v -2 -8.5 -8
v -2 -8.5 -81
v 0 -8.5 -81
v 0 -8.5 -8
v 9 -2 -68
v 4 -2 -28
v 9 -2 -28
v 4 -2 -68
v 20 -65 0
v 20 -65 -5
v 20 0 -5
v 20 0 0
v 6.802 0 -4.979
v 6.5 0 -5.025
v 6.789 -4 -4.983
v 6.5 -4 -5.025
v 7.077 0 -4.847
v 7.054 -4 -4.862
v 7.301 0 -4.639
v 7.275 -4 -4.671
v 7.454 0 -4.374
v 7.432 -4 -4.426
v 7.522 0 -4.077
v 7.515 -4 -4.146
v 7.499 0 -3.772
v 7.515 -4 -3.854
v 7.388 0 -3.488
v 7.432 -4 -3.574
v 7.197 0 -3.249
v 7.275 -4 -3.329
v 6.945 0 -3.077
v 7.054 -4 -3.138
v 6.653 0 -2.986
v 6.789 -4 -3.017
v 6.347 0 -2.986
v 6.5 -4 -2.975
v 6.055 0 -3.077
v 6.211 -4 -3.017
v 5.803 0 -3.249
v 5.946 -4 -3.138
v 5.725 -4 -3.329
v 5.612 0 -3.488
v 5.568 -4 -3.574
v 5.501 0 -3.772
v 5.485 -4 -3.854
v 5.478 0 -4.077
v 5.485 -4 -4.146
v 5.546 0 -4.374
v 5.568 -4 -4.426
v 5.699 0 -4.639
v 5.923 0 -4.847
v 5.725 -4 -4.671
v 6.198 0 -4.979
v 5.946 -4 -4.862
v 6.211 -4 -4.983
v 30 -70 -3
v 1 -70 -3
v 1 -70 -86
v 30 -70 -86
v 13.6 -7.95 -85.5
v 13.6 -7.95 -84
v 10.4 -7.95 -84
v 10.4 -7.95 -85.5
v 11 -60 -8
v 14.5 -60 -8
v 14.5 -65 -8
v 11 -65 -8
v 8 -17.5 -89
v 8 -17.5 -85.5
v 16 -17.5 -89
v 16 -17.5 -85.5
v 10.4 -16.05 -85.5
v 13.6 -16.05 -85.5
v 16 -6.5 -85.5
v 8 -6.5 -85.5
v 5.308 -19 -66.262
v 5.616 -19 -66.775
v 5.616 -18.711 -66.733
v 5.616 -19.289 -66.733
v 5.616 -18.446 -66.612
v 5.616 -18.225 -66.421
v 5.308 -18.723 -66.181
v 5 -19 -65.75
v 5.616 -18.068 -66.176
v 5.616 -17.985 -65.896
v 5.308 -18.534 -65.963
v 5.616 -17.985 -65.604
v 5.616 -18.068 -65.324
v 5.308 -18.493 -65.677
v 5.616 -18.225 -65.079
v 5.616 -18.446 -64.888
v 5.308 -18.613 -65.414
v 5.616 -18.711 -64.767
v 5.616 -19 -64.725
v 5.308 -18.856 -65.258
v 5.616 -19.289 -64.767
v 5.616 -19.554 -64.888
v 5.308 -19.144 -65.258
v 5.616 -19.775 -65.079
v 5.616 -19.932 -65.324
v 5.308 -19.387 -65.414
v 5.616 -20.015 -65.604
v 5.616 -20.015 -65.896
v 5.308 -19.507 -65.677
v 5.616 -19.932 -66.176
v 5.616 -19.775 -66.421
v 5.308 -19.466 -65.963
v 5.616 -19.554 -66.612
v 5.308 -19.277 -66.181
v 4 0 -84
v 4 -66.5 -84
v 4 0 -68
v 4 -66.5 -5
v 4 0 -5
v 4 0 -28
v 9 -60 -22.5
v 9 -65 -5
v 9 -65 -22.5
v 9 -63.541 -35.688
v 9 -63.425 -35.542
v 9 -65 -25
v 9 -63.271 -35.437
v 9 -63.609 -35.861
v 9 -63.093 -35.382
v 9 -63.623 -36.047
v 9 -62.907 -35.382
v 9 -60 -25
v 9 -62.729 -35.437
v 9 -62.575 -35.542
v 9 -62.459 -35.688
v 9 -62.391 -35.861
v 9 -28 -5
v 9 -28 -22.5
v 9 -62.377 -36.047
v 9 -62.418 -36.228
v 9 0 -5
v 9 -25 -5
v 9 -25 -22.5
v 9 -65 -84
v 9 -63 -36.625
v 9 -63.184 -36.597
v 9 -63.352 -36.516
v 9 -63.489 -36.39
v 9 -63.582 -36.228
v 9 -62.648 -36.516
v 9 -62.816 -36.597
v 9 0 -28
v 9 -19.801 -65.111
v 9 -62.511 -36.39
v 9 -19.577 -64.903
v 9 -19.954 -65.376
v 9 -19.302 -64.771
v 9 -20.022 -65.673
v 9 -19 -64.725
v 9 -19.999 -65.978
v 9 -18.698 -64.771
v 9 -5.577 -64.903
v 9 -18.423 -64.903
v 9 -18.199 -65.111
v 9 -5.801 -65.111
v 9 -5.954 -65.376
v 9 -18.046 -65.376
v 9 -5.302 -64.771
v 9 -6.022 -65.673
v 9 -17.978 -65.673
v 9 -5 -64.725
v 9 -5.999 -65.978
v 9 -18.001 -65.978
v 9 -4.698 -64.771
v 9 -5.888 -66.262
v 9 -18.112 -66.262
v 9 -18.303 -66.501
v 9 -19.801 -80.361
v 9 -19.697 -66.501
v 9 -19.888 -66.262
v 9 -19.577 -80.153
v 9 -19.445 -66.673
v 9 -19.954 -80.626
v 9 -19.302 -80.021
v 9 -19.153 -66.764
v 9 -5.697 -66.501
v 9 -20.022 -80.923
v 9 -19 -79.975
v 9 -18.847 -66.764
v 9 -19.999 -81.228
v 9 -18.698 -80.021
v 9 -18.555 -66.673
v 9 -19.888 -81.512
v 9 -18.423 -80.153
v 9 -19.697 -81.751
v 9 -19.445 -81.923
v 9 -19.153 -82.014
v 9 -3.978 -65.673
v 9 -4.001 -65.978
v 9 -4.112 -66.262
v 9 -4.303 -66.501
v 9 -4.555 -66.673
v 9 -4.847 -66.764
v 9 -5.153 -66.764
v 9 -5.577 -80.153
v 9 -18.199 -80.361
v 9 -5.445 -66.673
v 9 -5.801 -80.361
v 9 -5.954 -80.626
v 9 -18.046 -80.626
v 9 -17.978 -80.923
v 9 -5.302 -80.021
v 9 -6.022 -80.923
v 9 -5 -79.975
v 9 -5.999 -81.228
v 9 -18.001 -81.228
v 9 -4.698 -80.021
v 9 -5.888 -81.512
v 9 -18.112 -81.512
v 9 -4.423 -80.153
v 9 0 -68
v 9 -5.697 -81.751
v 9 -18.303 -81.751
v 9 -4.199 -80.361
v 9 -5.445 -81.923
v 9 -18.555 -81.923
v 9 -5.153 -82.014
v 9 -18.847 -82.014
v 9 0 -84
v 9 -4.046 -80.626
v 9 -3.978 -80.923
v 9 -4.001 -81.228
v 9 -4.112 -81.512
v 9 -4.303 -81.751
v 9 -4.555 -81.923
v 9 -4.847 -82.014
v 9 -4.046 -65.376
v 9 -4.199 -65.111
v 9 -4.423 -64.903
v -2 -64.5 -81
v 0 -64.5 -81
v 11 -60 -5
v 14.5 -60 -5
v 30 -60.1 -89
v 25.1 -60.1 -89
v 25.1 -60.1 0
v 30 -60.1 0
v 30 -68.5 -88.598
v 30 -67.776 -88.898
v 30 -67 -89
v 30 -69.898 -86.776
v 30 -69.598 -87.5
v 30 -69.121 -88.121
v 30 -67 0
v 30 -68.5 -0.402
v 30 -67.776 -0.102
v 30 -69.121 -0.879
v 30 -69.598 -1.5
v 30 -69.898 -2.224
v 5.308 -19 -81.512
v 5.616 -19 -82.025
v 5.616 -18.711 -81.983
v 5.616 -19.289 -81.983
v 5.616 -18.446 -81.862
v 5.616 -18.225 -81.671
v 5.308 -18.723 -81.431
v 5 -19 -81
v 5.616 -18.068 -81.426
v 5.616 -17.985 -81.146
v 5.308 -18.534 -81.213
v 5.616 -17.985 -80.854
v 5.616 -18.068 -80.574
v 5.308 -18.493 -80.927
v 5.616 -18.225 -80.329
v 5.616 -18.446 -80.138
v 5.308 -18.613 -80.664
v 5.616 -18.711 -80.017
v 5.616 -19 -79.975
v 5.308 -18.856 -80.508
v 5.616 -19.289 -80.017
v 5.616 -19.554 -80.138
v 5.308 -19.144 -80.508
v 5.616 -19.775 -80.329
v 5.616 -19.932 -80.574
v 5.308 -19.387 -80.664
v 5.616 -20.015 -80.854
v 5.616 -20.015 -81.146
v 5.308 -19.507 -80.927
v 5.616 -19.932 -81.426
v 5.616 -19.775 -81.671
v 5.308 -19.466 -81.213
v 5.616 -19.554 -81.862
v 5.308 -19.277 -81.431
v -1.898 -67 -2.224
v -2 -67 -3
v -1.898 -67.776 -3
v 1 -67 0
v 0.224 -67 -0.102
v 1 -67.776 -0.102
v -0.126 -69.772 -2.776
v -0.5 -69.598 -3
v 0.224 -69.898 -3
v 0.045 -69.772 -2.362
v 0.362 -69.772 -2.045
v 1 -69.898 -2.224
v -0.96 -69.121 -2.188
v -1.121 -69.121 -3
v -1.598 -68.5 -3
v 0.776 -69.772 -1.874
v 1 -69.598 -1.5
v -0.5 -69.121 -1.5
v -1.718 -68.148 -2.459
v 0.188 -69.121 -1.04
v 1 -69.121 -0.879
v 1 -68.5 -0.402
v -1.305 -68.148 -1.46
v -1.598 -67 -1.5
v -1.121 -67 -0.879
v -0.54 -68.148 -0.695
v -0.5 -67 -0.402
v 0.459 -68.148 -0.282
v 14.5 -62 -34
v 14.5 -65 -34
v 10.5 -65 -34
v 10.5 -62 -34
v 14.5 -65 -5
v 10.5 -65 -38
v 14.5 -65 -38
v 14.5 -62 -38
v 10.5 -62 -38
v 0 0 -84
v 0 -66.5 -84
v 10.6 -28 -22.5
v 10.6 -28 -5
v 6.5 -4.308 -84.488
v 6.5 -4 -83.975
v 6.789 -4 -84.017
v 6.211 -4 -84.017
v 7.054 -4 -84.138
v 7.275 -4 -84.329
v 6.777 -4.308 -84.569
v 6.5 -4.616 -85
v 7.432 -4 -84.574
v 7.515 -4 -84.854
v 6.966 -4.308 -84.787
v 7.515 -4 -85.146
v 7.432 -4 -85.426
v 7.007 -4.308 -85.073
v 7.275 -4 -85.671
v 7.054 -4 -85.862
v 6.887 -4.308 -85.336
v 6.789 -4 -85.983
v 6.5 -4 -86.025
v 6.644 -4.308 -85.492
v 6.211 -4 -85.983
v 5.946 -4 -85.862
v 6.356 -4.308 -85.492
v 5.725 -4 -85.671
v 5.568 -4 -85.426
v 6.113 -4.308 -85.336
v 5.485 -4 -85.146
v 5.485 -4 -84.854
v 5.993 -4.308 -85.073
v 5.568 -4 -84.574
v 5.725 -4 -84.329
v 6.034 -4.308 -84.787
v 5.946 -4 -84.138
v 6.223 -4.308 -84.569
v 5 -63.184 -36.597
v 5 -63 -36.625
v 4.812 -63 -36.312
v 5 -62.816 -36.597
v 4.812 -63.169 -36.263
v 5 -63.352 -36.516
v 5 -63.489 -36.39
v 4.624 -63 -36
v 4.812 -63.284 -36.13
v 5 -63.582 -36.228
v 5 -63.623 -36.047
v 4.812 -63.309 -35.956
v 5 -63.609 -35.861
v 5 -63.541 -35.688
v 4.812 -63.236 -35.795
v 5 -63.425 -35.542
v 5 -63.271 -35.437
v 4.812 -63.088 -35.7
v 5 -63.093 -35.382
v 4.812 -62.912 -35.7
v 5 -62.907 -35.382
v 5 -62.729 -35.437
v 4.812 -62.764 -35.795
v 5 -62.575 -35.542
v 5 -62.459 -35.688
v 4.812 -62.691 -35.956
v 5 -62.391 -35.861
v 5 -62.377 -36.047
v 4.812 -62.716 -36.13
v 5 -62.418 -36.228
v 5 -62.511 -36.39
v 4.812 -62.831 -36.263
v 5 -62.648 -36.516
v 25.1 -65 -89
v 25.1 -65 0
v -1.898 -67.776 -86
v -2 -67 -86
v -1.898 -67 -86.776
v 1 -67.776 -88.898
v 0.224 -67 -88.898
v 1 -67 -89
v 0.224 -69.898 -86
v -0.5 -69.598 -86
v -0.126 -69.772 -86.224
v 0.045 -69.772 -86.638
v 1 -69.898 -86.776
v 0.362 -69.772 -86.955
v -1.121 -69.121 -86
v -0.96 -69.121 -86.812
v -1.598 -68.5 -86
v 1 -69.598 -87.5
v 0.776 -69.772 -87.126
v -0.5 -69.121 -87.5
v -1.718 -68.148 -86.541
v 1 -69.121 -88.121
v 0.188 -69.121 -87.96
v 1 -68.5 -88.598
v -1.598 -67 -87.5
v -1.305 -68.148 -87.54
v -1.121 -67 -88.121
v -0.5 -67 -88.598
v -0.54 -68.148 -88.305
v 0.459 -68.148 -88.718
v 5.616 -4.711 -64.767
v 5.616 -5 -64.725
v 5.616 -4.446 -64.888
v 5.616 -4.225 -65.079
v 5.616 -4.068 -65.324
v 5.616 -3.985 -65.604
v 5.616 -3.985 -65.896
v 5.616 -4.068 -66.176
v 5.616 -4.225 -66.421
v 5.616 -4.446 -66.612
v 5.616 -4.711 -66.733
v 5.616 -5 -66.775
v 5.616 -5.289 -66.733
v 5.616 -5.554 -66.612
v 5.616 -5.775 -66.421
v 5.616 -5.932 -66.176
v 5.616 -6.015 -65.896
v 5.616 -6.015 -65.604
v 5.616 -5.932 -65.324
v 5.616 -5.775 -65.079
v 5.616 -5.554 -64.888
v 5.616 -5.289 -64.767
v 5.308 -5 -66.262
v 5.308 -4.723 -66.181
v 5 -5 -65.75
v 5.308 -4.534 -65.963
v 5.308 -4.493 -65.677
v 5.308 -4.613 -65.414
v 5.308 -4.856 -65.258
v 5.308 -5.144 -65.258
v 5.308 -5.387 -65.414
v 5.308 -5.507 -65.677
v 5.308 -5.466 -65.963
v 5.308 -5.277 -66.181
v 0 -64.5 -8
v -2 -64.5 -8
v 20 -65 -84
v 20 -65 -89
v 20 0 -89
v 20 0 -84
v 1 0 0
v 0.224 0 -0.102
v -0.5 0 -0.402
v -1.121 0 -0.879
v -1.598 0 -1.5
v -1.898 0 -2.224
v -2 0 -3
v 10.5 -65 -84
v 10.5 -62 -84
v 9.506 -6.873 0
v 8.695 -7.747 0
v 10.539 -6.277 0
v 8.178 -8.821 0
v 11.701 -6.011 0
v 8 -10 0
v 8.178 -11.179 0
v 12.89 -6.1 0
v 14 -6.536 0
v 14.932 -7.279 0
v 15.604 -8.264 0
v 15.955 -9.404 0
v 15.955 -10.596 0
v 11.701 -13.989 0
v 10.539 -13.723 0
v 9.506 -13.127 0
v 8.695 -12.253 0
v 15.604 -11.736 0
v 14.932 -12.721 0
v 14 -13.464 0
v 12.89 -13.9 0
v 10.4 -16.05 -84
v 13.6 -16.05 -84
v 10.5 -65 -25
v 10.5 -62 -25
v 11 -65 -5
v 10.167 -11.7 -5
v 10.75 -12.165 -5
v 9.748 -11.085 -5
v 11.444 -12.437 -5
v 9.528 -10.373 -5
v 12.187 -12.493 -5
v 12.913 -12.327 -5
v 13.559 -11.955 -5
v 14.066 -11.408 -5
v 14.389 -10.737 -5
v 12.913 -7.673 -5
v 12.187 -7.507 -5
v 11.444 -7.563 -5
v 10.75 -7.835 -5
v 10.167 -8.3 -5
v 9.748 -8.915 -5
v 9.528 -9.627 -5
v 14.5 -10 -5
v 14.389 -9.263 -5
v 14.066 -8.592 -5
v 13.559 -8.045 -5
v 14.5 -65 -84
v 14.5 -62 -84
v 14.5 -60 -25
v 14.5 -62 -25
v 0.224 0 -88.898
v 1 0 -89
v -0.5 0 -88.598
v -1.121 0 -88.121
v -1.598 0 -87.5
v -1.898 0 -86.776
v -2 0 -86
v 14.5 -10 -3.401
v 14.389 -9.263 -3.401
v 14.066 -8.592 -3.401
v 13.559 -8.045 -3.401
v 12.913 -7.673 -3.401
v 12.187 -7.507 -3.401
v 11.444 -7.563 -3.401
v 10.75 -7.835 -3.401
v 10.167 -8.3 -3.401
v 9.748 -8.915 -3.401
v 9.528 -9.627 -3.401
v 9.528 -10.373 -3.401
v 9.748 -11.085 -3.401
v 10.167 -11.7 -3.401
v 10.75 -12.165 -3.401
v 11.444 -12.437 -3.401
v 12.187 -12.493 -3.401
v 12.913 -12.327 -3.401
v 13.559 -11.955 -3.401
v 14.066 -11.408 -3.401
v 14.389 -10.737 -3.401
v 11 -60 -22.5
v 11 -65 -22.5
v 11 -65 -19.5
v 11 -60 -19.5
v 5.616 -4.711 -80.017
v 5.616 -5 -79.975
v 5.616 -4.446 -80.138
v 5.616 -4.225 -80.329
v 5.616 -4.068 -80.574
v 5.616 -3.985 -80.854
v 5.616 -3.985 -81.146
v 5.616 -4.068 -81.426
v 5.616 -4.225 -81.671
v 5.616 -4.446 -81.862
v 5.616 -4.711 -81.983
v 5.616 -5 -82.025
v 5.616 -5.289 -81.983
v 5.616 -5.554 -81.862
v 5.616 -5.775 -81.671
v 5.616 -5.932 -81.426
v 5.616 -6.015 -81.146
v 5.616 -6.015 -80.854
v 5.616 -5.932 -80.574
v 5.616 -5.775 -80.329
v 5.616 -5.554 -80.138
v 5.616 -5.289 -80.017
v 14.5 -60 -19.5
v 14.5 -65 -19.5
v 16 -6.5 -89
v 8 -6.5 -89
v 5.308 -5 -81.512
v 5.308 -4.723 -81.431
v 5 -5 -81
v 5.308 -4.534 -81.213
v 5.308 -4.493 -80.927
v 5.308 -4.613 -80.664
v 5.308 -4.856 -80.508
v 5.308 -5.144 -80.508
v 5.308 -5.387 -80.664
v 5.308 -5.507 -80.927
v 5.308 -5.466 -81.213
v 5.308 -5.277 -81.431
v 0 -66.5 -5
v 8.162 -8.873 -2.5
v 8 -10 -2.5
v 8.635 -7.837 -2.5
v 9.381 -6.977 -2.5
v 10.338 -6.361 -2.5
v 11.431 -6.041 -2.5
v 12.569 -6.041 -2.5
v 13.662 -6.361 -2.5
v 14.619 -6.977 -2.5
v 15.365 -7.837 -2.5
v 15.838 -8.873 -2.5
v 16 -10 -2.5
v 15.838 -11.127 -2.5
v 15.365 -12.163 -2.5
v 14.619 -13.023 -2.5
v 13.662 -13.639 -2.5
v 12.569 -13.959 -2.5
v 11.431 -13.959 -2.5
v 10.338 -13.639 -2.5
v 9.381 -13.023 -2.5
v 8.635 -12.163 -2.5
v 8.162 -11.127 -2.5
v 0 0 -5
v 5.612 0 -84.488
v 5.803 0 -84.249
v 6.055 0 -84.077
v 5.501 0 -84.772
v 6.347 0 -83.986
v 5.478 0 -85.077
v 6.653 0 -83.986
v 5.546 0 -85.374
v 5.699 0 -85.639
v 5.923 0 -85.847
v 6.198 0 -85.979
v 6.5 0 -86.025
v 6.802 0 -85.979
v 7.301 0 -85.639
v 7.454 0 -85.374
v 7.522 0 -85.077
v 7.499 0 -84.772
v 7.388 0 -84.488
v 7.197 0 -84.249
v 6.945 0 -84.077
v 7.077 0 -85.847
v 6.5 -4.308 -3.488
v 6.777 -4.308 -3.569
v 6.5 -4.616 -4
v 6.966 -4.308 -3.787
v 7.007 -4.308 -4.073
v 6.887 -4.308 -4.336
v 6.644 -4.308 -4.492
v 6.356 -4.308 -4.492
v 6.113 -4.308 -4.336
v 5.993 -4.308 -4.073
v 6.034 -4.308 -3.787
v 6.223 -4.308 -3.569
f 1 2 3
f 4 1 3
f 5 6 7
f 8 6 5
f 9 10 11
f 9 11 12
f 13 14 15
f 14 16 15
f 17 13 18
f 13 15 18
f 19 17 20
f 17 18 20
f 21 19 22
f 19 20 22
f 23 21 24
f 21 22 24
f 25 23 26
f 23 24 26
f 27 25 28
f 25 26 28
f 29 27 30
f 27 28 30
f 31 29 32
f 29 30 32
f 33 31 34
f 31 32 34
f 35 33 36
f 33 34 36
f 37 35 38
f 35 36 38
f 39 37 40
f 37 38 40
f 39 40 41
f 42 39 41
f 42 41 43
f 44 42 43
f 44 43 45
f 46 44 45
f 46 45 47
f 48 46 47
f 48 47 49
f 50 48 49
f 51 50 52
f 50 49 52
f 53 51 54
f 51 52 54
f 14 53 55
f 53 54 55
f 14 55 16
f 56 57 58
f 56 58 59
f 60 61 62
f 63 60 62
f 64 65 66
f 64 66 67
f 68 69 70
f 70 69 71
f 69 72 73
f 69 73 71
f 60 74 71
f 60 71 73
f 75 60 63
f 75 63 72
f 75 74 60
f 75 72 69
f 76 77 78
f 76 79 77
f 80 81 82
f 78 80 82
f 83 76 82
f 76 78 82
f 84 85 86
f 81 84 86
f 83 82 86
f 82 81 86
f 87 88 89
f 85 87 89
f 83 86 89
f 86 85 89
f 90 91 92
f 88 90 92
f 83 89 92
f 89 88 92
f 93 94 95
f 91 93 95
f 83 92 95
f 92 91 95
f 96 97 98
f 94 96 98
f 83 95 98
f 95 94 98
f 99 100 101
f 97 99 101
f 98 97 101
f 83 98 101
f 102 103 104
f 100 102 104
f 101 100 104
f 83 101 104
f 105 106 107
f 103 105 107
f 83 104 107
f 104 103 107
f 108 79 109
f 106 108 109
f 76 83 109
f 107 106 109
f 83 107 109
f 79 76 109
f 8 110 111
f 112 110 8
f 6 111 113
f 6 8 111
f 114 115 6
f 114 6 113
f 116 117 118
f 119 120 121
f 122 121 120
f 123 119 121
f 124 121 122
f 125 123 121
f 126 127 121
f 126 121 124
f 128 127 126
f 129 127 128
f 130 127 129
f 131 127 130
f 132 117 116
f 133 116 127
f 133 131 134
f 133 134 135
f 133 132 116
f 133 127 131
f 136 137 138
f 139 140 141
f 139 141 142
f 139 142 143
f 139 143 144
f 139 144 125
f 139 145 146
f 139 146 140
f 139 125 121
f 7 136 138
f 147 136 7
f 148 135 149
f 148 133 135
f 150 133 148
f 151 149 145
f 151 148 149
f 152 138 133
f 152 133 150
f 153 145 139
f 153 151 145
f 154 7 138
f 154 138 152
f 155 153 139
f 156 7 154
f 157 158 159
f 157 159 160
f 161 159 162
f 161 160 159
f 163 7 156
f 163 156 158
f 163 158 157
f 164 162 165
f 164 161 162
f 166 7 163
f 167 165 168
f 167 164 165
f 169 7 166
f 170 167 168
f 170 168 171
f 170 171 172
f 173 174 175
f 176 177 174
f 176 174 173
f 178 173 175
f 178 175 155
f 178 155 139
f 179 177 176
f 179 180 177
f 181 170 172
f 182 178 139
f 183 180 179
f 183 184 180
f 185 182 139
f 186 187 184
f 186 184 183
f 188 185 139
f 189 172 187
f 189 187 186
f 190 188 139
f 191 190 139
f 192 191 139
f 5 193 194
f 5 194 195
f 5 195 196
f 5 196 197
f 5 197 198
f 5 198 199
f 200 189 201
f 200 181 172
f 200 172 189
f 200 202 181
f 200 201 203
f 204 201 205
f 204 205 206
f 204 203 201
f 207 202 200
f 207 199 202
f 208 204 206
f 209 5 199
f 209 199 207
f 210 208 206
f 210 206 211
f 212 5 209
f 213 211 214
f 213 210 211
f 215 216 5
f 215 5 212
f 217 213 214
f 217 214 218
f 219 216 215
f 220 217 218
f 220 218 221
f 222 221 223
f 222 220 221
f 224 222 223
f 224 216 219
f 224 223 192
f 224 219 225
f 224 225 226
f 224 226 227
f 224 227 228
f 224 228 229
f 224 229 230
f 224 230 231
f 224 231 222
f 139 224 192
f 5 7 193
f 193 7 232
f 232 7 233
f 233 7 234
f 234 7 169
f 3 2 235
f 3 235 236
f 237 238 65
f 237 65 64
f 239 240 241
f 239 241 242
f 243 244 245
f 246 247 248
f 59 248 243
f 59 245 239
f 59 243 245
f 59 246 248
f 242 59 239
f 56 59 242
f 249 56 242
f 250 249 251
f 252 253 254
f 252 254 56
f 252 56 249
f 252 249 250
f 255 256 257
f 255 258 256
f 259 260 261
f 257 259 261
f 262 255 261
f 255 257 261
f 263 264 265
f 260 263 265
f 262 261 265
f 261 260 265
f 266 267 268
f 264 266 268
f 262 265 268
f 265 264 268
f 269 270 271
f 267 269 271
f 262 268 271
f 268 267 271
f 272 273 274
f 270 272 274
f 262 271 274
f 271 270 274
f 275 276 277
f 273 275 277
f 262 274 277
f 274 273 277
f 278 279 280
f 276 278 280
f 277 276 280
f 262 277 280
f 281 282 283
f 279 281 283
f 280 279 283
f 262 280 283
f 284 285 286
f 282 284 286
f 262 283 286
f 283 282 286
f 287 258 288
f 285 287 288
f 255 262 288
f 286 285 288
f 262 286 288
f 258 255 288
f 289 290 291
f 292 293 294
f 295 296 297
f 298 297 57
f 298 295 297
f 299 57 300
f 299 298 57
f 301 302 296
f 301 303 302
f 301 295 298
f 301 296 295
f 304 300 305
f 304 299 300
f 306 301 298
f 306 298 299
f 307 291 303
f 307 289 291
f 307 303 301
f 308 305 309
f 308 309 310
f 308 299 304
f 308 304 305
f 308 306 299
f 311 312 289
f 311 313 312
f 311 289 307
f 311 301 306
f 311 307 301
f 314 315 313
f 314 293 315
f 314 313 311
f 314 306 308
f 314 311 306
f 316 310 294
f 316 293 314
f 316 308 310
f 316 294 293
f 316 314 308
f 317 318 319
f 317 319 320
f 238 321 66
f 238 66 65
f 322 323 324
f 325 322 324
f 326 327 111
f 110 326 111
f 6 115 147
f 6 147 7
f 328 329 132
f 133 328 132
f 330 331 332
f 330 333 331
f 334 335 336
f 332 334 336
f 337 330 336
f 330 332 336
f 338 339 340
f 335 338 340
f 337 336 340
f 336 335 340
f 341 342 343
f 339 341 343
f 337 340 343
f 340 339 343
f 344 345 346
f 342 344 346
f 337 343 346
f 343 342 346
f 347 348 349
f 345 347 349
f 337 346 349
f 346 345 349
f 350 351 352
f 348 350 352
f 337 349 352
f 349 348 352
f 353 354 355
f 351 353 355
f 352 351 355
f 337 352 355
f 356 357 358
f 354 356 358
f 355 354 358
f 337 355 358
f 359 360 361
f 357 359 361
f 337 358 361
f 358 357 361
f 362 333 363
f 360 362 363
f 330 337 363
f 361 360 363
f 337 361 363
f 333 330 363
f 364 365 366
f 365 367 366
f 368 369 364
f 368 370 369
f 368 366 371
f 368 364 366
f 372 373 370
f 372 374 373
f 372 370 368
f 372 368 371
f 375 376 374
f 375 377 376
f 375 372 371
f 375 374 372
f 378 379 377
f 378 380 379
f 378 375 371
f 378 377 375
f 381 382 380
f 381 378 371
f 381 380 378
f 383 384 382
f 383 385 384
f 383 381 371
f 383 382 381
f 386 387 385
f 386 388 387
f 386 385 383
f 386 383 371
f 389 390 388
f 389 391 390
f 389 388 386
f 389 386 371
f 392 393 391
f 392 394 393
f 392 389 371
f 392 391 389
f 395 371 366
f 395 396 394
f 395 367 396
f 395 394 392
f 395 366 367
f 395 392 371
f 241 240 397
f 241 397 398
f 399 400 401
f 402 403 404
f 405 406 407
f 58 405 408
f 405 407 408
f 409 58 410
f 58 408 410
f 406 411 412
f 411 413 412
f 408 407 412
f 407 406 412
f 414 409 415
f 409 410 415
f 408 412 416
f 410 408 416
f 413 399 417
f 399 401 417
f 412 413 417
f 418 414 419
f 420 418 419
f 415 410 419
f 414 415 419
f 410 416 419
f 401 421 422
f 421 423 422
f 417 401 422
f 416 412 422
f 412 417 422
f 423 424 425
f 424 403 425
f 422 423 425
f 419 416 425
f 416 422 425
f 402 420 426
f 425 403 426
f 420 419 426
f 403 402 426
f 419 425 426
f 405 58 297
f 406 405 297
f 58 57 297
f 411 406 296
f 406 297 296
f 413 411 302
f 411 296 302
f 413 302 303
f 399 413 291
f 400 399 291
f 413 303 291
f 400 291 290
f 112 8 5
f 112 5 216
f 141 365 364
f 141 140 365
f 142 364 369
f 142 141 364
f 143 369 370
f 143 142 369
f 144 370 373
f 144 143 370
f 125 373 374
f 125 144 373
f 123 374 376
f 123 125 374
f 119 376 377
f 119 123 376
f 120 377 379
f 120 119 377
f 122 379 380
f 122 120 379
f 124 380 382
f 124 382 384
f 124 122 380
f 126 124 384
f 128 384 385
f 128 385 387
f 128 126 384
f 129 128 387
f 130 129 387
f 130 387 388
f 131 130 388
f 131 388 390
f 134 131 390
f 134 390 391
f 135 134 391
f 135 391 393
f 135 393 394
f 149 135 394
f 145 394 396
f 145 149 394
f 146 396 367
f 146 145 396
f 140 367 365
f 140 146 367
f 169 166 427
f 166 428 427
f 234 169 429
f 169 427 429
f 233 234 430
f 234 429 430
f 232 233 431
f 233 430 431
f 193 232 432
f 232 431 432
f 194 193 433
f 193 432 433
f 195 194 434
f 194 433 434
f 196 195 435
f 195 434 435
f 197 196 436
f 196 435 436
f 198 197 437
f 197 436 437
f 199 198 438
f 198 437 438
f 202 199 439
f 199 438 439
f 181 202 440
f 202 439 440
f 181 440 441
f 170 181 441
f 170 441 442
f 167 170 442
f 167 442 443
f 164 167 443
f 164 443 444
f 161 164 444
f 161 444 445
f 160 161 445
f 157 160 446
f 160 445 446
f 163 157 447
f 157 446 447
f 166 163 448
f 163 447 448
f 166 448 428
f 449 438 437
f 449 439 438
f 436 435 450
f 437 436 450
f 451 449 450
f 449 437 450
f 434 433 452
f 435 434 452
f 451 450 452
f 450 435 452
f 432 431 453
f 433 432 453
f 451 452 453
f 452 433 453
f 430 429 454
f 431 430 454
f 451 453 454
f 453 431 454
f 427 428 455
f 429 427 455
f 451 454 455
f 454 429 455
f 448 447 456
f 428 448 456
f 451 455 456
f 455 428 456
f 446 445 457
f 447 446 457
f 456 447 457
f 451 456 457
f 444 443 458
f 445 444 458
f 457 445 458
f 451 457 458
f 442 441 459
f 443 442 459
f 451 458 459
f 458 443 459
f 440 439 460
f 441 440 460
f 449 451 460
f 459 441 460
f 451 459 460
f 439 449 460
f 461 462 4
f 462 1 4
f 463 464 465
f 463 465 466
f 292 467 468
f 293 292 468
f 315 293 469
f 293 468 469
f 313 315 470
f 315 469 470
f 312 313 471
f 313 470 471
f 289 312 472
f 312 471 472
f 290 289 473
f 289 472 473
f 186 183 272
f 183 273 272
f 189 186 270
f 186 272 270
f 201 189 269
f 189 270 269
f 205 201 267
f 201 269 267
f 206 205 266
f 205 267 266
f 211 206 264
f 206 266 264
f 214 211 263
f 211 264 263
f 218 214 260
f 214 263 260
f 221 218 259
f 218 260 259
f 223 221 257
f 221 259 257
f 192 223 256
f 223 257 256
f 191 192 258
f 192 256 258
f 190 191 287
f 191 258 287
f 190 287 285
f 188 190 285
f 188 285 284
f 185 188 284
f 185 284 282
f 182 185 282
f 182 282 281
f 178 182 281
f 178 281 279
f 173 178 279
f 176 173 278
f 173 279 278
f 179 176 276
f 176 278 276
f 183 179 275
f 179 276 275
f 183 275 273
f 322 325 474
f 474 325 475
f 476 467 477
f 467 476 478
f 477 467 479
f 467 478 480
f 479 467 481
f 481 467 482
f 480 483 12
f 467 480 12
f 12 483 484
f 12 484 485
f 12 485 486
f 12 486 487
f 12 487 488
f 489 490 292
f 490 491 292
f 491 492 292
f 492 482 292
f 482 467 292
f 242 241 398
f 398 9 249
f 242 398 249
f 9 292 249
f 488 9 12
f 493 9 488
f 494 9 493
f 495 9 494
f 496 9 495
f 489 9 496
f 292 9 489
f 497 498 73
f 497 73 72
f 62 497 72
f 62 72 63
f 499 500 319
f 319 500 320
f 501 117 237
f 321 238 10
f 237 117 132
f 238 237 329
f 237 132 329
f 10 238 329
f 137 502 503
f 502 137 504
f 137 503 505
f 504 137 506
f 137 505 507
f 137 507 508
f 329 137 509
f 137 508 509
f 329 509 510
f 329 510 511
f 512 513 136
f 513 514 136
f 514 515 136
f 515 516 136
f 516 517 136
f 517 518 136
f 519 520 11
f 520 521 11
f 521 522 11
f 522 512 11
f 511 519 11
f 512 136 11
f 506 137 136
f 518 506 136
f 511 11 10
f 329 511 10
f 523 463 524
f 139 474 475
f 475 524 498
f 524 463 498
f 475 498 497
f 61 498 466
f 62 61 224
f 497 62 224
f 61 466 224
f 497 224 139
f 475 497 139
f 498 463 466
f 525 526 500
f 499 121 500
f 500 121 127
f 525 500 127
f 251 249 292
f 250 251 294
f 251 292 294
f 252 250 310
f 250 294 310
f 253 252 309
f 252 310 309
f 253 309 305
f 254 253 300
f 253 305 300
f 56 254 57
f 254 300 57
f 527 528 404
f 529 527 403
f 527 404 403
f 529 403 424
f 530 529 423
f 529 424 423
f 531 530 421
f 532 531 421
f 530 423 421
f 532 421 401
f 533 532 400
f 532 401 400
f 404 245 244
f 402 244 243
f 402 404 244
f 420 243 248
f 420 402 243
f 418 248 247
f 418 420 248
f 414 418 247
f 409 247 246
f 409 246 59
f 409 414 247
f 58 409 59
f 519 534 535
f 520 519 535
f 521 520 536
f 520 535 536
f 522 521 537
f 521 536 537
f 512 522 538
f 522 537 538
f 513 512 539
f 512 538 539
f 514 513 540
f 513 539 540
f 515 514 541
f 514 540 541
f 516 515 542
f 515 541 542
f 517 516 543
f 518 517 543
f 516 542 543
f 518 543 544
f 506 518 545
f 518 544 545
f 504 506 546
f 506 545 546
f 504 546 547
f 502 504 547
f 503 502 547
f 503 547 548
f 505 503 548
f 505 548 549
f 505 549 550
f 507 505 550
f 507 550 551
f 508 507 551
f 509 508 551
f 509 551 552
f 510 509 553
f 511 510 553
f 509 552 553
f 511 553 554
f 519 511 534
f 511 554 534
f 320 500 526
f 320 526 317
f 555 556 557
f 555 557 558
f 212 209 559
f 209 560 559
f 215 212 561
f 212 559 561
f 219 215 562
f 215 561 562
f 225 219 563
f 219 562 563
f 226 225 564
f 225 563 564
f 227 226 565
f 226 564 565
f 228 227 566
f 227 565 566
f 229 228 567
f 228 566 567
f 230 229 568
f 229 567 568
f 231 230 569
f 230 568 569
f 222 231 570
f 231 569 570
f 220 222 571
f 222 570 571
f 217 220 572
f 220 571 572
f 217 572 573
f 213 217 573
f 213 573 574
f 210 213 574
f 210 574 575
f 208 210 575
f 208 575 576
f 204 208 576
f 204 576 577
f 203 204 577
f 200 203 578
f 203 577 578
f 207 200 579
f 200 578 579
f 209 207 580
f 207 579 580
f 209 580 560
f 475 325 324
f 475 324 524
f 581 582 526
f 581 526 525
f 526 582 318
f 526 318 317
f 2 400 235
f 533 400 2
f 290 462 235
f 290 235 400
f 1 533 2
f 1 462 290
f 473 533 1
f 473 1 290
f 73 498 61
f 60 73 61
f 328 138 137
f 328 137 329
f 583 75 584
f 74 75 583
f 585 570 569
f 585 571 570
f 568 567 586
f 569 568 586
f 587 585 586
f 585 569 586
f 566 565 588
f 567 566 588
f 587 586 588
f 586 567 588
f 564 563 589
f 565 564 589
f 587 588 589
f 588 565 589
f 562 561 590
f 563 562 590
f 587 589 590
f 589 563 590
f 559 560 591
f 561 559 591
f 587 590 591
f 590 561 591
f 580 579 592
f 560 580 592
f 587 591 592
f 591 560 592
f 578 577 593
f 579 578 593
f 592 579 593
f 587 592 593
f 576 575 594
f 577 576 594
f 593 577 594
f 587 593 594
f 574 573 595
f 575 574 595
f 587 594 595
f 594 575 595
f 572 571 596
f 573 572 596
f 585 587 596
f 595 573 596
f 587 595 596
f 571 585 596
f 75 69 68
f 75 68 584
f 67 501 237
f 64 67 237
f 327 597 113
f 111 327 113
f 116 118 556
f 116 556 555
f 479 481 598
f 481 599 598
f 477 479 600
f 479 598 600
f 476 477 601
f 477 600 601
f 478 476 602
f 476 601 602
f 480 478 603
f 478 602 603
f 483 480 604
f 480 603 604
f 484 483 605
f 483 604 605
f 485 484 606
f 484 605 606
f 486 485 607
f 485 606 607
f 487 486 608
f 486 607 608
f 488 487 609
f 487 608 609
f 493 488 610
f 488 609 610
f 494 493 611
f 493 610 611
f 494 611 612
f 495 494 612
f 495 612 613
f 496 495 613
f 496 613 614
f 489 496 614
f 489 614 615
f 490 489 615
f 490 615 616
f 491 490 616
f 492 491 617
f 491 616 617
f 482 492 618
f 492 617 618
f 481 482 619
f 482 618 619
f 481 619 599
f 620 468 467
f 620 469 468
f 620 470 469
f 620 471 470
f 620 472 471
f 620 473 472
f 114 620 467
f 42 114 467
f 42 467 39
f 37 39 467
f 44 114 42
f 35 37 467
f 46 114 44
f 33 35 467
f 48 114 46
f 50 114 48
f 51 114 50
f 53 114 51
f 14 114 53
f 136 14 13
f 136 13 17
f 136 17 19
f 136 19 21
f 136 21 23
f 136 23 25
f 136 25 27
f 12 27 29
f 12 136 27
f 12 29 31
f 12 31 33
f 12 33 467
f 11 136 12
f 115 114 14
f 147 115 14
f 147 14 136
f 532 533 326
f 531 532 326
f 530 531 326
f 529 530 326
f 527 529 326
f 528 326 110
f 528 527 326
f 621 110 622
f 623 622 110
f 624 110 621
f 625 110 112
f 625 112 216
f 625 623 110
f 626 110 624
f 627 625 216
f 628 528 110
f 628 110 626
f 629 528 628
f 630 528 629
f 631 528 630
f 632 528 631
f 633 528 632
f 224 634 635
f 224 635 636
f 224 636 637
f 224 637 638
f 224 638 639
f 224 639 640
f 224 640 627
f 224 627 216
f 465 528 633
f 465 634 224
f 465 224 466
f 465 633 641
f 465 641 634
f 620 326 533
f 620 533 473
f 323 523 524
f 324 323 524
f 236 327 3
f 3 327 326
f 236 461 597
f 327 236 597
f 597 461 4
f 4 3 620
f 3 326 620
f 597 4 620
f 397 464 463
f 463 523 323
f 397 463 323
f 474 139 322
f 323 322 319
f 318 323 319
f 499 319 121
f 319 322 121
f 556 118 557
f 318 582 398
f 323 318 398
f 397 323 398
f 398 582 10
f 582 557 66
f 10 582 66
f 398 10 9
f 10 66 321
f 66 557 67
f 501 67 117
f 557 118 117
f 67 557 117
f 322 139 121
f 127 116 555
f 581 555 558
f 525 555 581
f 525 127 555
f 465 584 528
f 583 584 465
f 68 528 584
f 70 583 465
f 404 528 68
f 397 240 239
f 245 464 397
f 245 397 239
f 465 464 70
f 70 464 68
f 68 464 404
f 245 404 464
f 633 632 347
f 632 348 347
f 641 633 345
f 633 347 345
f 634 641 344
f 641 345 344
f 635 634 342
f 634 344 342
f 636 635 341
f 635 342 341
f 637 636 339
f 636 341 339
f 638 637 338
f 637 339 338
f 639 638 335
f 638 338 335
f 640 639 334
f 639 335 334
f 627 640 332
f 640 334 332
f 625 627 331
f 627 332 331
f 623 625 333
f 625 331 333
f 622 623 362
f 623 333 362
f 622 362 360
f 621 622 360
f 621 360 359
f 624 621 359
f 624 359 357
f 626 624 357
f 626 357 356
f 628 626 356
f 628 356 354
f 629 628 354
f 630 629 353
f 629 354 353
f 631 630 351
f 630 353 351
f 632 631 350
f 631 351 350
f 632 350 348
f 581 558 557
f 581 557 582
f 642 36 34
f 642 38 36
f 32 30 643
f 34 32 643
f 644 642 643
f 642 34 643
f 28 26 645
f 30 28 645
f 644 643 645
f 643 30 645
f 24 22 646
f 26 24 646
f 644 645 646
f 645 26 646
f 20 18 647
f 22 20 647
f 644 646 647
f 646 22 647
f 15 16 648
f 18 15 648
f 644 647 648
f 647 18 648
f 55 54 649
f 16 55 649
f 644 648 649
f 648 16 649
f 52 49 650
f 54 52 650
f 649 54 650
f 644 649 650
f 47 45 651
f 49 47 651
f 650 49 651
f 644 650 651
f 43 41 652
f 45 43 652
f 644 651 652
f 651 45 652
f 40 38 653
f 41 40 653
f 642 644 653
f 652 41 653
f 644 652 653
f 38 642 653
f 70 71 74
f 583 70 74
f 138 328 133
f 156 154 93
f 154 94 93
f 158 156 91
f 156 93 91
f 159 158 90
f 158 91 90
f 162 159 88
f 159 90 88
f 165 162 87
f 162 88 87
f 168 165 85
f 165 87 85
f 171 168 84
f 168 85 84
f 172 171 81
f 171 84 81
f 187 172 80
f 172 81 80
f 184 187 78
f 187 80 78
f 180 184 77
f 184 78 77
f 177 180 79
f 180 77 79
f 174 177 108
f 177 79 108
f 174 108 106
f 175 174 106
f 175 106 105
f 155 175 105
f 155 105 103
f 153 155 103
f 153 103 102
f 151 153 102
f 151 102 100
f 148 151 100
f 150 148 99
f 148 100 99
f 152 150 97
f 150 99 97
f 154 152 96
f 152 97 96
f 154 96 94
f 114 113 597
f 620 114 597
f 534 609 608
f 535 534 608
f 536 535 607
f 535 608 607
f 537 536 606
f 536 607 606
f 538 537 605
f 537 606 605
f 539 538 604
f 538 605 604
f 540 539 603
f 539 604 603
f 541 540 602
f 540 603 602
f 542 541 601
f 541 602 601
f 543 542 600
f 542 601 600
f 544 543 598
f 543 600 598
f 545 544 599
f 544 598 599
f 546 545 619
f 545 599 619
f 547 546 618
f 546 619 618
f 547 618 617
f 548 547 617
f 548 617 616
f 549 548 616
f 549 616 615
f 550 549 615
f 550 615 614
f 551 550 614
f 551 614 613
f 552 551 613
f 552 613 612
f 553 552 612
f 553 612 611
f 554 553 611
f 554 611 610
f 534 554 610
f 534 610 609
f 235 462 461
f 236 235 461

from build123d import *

# Parameters (mm, degrees)
BOSS_EXTRUDE4_DEPTH          = 65
SKETCH5_W                    = 73
SKETCH5_H                    = 7
SKETCH5_H_2                  = 2
BOSS_EXTRUDE5_DEPTH          = 2
CUT_EXTRUDE8_DEPTH           = 111.756489652
CUT_EXTRUDE8_DEPTH_BACK      = 5
SKETCH9_W                    = 5
SKETCH9_H                    = 3
SKETCH9_W_2                  = 2.5
BOSS_EXTRUDE8_DEPTH          = 1.5
SKETCH10_W                   = 66.5
SKETCH10_H                   = 3
BOSS_EXTRUDE9_DEPTH          = 4
M2_5X0_45_TAPPED_HOLE1_D     = 2.05
M2_5X0_45_TAPPED_HOLE1_DEPTH = 3.384117865
M2_5X0_45_TAPPED_HOLE1_TIP   = 0.615882135
SKETCH17_W                   = 11
SKETCH17_H                   = 5
BOSS_EXTRUDE20_DEPTH         = 65
CUT_EXTRUDE10_REACH          = 110.079
SKETCH18_W                   = 8
SKETCH18_H                   = 11
SKETCH20_W                   = 2.5
SKETCH20_H                   = 2
BOSS_EXTRUDE13_DEPTH         = 5.5
SKETCH22_W                   = 3.5
SKETCH22_H                   = 5
BOSS_EXTRUDE21_DEPTH         = 3
SKETCH23_W                   = 3.499642839
SKETCH23_H                   = 5
BOSS_EXTRUDE17_DEPTH         = 3
BOSS_EXTRUDE18_DEPTH         = 17.5
SKETCH27_W                   = 4
SKETCH27_H                   = 3
CUT_EXTRUDE12_DEPTH          = 5.5
M2_5X0_45_TAPPED_HOLE2_D     = 2.05
M2_5X0_45_TAPPED_HOLE2_DEPTH = 4
M2_5X0_45_TAPPED_HOLE2_TIP   = 0.615882135
SKETCH31_W                   = 8
SKETCH31_H                   = 11
SKETCH31_W_2                 = 3.2
SKETCH31_H_2                 = 8.1
BOSS_EXTRUDE22_DEPTH         = 1.5
F_5_0MM_DOWEL_HOLE1_D        = 5
F_5_0MM_DOWEL_HOLE1_DEPTH    = 5
SKETCH36_W                   = 22
SKETCH36_H                   = 89
BOSS_EXTRUDE23_DEPTH         = 5
F_8_0MM_DOWEL_HOLE1_D        = 8
F_8_0MM_DOWEL_HOLE1_DEPTH    = 2.5
F_8_0MM_DOWEL_HOLE1_TIP      = 2.403442476
SKETCH42_W                   = 2
SKETCH42_H                   = 73
BOSS_EXTRUDE25_DEPTH         = 1.5
SKETCH43_W                   = 2
SKETCH43_H                   = 73
CUT_EXTRUDE13_DEPTH          = 1.5
SKETCH44_W                   = 4
SKETCH44_H                   = 79
CUT_EXTRUDE14_DEPTH          = 1.5
SKETCH46_W                   = 5
SKETCH46_H                   = 89
BOSS_EXTRUDE26_DEPTH         = 10
SKETCH46_3_W                 = 5
SKETCH46_3_H                 = 89
BOSS_EXTRUDE27_DEPTH         = 5
FILLET1_R                    = 3
SKETCH47_W                   = 5
SKETCH47_H                   = 89
CUT_EXTRUDE15_DEPTH          = 0.1
SKETCH48_W                   = 89
SKETCH48_H                   = 4.9
CUT_EXTRUDE16_DEPTH          = 0.1


with BuildPart() as part:
    # Sketch4 → Boss-Extrude4 (new body)
    with BuildSketch(Plane(origin=(0, 0, 0), x_dir=(1, 0, 0), z_dir=(0, 1, 0))):
        Polygon((0, 0), (9, 0), (9, 89), (0, 89), (-2, 89), (-2, 81), (0, 81), (0, 84), (4, 84), (4, 5), (0, 5), (0, 8), (-2, 8), (-2, 0), align=None)
    extrude(amount=-BOSS_EXTRUDE4_DEPTH)

    # Sketch5 → Boss-Extrude5 (add)
    with BuildSketch(Plane.ZY.offset(2)):
        with Locations((-44.5, -3.5)):
            Rectangle(SKETCH5_W, SKETCH5_H)
        with Locations((-44.5, -64)):
            Rectangle(SKETCH5_W, SKETCH5_H_2)
    extrude(amount=-BOSS_EXTRUDE5_DEPTH)

    # Sketch8 → Cut-Extrude8 (cut, two sides: drawn at the far end of the back side and taken through both)
    with BuildSketch(Plane(origin=(9, 0, 0), x_dir=(0, 0, -1), z_dir=(1, 0, 0)).offset(-CUT_EXTRUDE8_DEPTH_BACK)):
        Polygon((28, 198.138247042), (28, 0), (28, -2), (68, -2), (68, 0), (68, 198.138247042), (68, 594.414741126), (28, 594.414741126), align=None)
    extrude(amount=CUT_EXTRUDE8_DEPTH + CUT_EXTRUDE8_DEPTH_BACK, mode=Mode.SUBTRACT)

    # Sketch9 → Boss-Extrude8 (add)
    with BuildSketch(Plane(origin=(9, 0, 0), x_dir=(0, 0, -1), z_dir=(1, 0, 0))):
        with Locations((86.5, -63.5)):
            Rectangle(SKETCH9_W, SKETCH9_H)
        with Locations((23.75, -63.5)):
            Rectangle(SKETCH9_W_2, SKETCH9_H)
    extrude(amount=BOSS_EXTRUDE8_DEPTH)

    # Sketch10 → Boss-Extrude9 (add)
    with BuildSketch(Plane(origin=(10.5, 0, 0), x_dir=(0, 0, -1), z_dir=(1, 0, 0))):
        with Locations((55.75, -63.5)):
            Rectangle(SKETCH10_W, SKETCH10_H)
    extrude(amount=BOSS_EXTRUDE9_DEPTH)

    # M2.5x0.45 Tapped Hole1
    with Locations(Plane(origin=(9, 0, 0), x_dir=(0, 0, -1), z_dir=(1, 0, 0))):
        with Locations((81, -5), (65.75, -19), (81, -19), (65.75, -5)):
            Hole(M2_5X0_45_TAPPED_HOLE1_D / 2, depth=M2_5X0_45_TAPPED_HOLE1_DEPTH)
            with Locations((0, 0, -(M2_5X0_45_TAPPED_HOLE1_DEPTH + M2_5X0_45_TAPPED_HOLE1_TIP / 2))):  # 118° drill point
                Cone(0, M2_5X0_45_TAPPED_HOLE1_D / 2, M2_5X0_45_TAPPED_HOLE1_TIP, mode=Mode.SUBTRACT)

    # Sketch17 → Boss-Extrude20 (add)
    with BuildSketch(Plane(origin=(0, 0, 0), x_dir=(1, 0, 0), z_dir=(0, 1, 0))):
        with Locations((14.5, 86.5)):
            Rectangle(SKETCH17_W, SKETCH17_H)
        with Locations((14.5, 2.5)):
            Rectangle(SKETCH17_W, SKETCH17_H)
    extrude(amount=-BOSS_EXTRUDE20_DEPTH)

    # Sketch18 → Cut-Extrude10 (cut, up to next)
    with BuildSketch(Plane.XY.offset(-84), mode=Mode.PRIVATE) as cut_extrude10_sk1:
        with Locations((12, -12)):
            Rectangle(SKETCH18_W, SKETCH18_H)
    cut_extrude10_tool1 = extrude(cut_extrude10_sk1.sketch, amount=-CUT_EXTRUDE10_REACH, mode=Mode.PRIVATE) & part.part
    add(cut_extrude10_tool1.solids().sort_by_distance((12, -12, -84))[0], mode=Mode.SUBTRACT)

    # Sketch20 → Boss-Extrude13 (add)
    with BuildSketch(Plane(origin=(9, 0, 0), x_dir=(0, 0, -1), z_dir=(1, 0, 0))):
        with Locations((23.75, -61)):
            Rectangle(SKETCH20_W, SKETCH20_H)
    extrude(amount=BOSS_EXTRUDE13_DEPTH)

    # Sketch22 → Boss-Extrude21 (add)
    with BuildSketch(Plane.XY.offset(-22.5)):
        with Locations((12.75, -62.5)):
            Rectangle(SKETCH22_W, SKETCH22_H)
    extrude(amount=BOSS_EXTRUDE21_DEPTH)

    # Sketch23 → Boss-Extrude17 (add)
    with BuildSketch(Plane(origin=(0, 0, -5), x_dir=(-1, 0, 0), z_dir=(0, 0, -1))):
        with Locations((-12.74982142, -62.5)):
            Rectangle(SKETCH23_W, SKETCH23_H)
    extrude(amount=BOSS_EXTRUDE17_DEPTH)

    # Sketch24 → Boss-Extrude18 (add)
    with BuildSketch(Plane(origin=(0, 0, -5), x_dir=(-1, 0, 0), z_dir=(0, 0, -1))):
        Polygon((-9, -25), (-10.6, -28), (-9, -28), align=None)
    extrude(amount=BOSS_EXTRUDE18_DEPTH)

    # Sketch25 → M1.6x0.35 Tapped Hole2 (revolve, cut)
    with BuildSketch(Plane(origin=(9, -63, -36), x_dir=(0, 0, -1), z_dir=(0, 1, 0))):
        Polygon((0, 0), (0, 4.375537887), (0.625, 4), (0.625, 0), align=None)
    revolve(axis=Axis((15.35, -63, -36), (-1, 0, 0)), mode=Mode.SUBTRACT)

    # Sketch27 → Cut-Extrude12 (cut)
    with BuildSketch(Plane(origin=(14.5, 0, 0), x_dir=(0, 0, -1), z_dir=(1, 0, 0))):
        with Locations((36, -63.5)):
            Rectangle(SKETCH27_W, SKETCH27_H)
    extrude(amount=-CUT_EXTRUDE12_DEPTH, mode=Mode.SUBTRACT)

    # M2.5x0.45 Tapped Hole2
    with Locations(Plane(origin=(6.5, 0, -4), x_dir=(0, 0, 1), z_dir=(0, 1, 0))):
        with Locations((0, 0), (-81, 0)):
            Hole(M2_5X0_45_TAPPED_HOLE2_D / 2, depth=M2_5X0_45_TAPPED_HOLE2_DEPTH)
            with Locations((0, 0, -(M2_5X0_45_TAPPED_HOLE2_DEPTH + M2_5X0_45_TAPPED_HOLE2_TIP / 2))):  # 118° drill point
                Cone(0, M2_5X0_45_TAPPED_HOLE2_D / 2, M2_5X0_45_TAPPED_HOLE2_TIP, mode=Mode.SUBTRACT)

    # Sketch31 → Boss-Extrude22 (add)
    with BuildSketch(Plane(origin=(0, 0, -84), x_dir=(-1, 0, 0), z_dir=(0, 0, -1))):
        with Locations((-12, -12)):
            Rectangle(SKETCH31_W, SKETCH31_H)
        with Locations((-12, -12)):
            Rectangle(SKETCH31_W_2, SKETCH31_H_2, mode=Mode.SUBTRACT)
    extrude(amount=BOSS_EXTRUDE22_DEPTH)

    # Ø5.0mm Dowel Hole1
    with Locations(Plane(origin=(0, 0, -5), x_dir=(-1, 0, 0), z_dir=(0, 0, -1))):
        with Locations((-12, -10)):
            Hole(F_5_0MM_DOWEL_HOLE1_D / 2, depth=F_5_0MM_DOWEL_HOLE1_DEPTH)

    # Sketch36 → Boss-Extrude23 (add)
    with BuildSketch(Plane.XZ.offset(65)):
        with Locations((9, -44.5)):
            Rectangle(SKETCH36_W, SKETCH36_H)
    extrude(amount=BOSS_EXTRUDE23_DEPTH)

    # Ø8.0mm Dowel Hole1
    with Locations(Plane.XY):
        with Locations((12, -10)):
            Hole(F_8_0MM_DOWEL_HOLE1_D / 2, depth=F_8_0MM_DOWEL_HOLE1_DEPTH)
            with Locations((0, 0, -(F_8_0MM_DOWEL_HOLE1_DEPTH + F_8_0MM_DOWEL_HOLE1_TIP / 2))):  # 118° drill point
                Cone(0, F_8_0MM_DOWEL_HOLE1_D / 2, F_8_0MM_DOWEL_HOLE1_TIP, mode=Mode.SUBTRACT)

    # Sketch42 → Boss-Extrude25 (add)
    with BuildSketch(Plane.XZ.offset(7)):
        with Locations((-1, -44.5)):
            Rectangle(SKETCH42_W, SKETCH42_H)
    extrude(amount=BOSS_EXTRUDE25_DEPTH)

    # Sketch43 → Cut-Extrude13 (cut)
    with BuildSketch(Plane(origin=(0, -63, 0), x_dir=(1, 0, 0), z_dir=(0, 1, 0))):
        with Locations((-1, 44.5)):
            Rectangle(SKETCH43_W, SKETCH43_H)
    extrude(amount=-CUT_EXTRUDE13_DEPTH, mode=Mode.SUBTRACT)

    # Sketch44 → Cut-Extrude14 (cut)
    with BuildSketch(Plane(origin=(0, -65, 0), x_dir=(1, 0, 0), z_dir=(0, 1, 0))):
        with Locations((2, 44.5)):
            Rectangle(SKETCH44_W, SKETCH44_H)
    extrude(amount=-CUT_EXTRUDE14_DEPTH, mode=Mode.SUBTRACT)



with BuildPart() as body_2:
    # Sketch46 → Boss-Extrude26 (new body)
    with BuildSketch(Plane.XZ.offset(70)):
        with Locations((27.5, -44.5)):
            Rectangle(SKETCH46_W, SKETCH46_H)
    extrude(amount=-BOSS_EXTRUDE26_DEPTH)


with BuildPart() as part_1:
    add(part.part)

    add(body_2.part)  # Boss-Extrude27 merges body 2
    # Sketch46<3> → Boss-Extrude27 (add)
    with BuildSketch(Plane.XZ.offset(70)):
        with Locations((22.5, -44.5)):
            Rectangle(SKETCH46_3_W, SKETCH46_3_H)
    extrude(amount=-BOSS_EXTRUDE27_DEPTH)

    # Fillet1
    fillet1_edges = [part_1.edges().sort_by_distance(p)[0] for p in [
        (-2, -35, 0),
        (-2, -35, -89),
        (-2, -70, -44.5),
        (14, -70, -89),
        (14, -70, 0),
    ]]
    fillet(fillet1_edges, radius=FILLET1_R)

    # Sketch47 → Cut-Extrude15 (cut)
    with BuildSketch(Plane(origin=(0, -60, 0), x_dir=(1, 0, 0), z_dir=(0, 1, 0))):
        with Locations((27.5, 44.5)):
            Rectangle(SKETCH47_W, SKETCH47_H)
    extrude(amount=-CUT_EXTRUDE15_DEPTH, mode=Mode.SUBTRACT)

    # Sketch48 → Cut-Extrude16 (cut)
    with BuildSketch(Plane.ZY.offset(-25)):
        with Locations((-44.5, -62.55)):
            Rectangle(SKETCH48_W, SKETCH48_H)
    extrude(amount=-CUT_EXTRUDE16_DEPTH, mode=Mode.SUBTRACT)


solid = part_1.part
